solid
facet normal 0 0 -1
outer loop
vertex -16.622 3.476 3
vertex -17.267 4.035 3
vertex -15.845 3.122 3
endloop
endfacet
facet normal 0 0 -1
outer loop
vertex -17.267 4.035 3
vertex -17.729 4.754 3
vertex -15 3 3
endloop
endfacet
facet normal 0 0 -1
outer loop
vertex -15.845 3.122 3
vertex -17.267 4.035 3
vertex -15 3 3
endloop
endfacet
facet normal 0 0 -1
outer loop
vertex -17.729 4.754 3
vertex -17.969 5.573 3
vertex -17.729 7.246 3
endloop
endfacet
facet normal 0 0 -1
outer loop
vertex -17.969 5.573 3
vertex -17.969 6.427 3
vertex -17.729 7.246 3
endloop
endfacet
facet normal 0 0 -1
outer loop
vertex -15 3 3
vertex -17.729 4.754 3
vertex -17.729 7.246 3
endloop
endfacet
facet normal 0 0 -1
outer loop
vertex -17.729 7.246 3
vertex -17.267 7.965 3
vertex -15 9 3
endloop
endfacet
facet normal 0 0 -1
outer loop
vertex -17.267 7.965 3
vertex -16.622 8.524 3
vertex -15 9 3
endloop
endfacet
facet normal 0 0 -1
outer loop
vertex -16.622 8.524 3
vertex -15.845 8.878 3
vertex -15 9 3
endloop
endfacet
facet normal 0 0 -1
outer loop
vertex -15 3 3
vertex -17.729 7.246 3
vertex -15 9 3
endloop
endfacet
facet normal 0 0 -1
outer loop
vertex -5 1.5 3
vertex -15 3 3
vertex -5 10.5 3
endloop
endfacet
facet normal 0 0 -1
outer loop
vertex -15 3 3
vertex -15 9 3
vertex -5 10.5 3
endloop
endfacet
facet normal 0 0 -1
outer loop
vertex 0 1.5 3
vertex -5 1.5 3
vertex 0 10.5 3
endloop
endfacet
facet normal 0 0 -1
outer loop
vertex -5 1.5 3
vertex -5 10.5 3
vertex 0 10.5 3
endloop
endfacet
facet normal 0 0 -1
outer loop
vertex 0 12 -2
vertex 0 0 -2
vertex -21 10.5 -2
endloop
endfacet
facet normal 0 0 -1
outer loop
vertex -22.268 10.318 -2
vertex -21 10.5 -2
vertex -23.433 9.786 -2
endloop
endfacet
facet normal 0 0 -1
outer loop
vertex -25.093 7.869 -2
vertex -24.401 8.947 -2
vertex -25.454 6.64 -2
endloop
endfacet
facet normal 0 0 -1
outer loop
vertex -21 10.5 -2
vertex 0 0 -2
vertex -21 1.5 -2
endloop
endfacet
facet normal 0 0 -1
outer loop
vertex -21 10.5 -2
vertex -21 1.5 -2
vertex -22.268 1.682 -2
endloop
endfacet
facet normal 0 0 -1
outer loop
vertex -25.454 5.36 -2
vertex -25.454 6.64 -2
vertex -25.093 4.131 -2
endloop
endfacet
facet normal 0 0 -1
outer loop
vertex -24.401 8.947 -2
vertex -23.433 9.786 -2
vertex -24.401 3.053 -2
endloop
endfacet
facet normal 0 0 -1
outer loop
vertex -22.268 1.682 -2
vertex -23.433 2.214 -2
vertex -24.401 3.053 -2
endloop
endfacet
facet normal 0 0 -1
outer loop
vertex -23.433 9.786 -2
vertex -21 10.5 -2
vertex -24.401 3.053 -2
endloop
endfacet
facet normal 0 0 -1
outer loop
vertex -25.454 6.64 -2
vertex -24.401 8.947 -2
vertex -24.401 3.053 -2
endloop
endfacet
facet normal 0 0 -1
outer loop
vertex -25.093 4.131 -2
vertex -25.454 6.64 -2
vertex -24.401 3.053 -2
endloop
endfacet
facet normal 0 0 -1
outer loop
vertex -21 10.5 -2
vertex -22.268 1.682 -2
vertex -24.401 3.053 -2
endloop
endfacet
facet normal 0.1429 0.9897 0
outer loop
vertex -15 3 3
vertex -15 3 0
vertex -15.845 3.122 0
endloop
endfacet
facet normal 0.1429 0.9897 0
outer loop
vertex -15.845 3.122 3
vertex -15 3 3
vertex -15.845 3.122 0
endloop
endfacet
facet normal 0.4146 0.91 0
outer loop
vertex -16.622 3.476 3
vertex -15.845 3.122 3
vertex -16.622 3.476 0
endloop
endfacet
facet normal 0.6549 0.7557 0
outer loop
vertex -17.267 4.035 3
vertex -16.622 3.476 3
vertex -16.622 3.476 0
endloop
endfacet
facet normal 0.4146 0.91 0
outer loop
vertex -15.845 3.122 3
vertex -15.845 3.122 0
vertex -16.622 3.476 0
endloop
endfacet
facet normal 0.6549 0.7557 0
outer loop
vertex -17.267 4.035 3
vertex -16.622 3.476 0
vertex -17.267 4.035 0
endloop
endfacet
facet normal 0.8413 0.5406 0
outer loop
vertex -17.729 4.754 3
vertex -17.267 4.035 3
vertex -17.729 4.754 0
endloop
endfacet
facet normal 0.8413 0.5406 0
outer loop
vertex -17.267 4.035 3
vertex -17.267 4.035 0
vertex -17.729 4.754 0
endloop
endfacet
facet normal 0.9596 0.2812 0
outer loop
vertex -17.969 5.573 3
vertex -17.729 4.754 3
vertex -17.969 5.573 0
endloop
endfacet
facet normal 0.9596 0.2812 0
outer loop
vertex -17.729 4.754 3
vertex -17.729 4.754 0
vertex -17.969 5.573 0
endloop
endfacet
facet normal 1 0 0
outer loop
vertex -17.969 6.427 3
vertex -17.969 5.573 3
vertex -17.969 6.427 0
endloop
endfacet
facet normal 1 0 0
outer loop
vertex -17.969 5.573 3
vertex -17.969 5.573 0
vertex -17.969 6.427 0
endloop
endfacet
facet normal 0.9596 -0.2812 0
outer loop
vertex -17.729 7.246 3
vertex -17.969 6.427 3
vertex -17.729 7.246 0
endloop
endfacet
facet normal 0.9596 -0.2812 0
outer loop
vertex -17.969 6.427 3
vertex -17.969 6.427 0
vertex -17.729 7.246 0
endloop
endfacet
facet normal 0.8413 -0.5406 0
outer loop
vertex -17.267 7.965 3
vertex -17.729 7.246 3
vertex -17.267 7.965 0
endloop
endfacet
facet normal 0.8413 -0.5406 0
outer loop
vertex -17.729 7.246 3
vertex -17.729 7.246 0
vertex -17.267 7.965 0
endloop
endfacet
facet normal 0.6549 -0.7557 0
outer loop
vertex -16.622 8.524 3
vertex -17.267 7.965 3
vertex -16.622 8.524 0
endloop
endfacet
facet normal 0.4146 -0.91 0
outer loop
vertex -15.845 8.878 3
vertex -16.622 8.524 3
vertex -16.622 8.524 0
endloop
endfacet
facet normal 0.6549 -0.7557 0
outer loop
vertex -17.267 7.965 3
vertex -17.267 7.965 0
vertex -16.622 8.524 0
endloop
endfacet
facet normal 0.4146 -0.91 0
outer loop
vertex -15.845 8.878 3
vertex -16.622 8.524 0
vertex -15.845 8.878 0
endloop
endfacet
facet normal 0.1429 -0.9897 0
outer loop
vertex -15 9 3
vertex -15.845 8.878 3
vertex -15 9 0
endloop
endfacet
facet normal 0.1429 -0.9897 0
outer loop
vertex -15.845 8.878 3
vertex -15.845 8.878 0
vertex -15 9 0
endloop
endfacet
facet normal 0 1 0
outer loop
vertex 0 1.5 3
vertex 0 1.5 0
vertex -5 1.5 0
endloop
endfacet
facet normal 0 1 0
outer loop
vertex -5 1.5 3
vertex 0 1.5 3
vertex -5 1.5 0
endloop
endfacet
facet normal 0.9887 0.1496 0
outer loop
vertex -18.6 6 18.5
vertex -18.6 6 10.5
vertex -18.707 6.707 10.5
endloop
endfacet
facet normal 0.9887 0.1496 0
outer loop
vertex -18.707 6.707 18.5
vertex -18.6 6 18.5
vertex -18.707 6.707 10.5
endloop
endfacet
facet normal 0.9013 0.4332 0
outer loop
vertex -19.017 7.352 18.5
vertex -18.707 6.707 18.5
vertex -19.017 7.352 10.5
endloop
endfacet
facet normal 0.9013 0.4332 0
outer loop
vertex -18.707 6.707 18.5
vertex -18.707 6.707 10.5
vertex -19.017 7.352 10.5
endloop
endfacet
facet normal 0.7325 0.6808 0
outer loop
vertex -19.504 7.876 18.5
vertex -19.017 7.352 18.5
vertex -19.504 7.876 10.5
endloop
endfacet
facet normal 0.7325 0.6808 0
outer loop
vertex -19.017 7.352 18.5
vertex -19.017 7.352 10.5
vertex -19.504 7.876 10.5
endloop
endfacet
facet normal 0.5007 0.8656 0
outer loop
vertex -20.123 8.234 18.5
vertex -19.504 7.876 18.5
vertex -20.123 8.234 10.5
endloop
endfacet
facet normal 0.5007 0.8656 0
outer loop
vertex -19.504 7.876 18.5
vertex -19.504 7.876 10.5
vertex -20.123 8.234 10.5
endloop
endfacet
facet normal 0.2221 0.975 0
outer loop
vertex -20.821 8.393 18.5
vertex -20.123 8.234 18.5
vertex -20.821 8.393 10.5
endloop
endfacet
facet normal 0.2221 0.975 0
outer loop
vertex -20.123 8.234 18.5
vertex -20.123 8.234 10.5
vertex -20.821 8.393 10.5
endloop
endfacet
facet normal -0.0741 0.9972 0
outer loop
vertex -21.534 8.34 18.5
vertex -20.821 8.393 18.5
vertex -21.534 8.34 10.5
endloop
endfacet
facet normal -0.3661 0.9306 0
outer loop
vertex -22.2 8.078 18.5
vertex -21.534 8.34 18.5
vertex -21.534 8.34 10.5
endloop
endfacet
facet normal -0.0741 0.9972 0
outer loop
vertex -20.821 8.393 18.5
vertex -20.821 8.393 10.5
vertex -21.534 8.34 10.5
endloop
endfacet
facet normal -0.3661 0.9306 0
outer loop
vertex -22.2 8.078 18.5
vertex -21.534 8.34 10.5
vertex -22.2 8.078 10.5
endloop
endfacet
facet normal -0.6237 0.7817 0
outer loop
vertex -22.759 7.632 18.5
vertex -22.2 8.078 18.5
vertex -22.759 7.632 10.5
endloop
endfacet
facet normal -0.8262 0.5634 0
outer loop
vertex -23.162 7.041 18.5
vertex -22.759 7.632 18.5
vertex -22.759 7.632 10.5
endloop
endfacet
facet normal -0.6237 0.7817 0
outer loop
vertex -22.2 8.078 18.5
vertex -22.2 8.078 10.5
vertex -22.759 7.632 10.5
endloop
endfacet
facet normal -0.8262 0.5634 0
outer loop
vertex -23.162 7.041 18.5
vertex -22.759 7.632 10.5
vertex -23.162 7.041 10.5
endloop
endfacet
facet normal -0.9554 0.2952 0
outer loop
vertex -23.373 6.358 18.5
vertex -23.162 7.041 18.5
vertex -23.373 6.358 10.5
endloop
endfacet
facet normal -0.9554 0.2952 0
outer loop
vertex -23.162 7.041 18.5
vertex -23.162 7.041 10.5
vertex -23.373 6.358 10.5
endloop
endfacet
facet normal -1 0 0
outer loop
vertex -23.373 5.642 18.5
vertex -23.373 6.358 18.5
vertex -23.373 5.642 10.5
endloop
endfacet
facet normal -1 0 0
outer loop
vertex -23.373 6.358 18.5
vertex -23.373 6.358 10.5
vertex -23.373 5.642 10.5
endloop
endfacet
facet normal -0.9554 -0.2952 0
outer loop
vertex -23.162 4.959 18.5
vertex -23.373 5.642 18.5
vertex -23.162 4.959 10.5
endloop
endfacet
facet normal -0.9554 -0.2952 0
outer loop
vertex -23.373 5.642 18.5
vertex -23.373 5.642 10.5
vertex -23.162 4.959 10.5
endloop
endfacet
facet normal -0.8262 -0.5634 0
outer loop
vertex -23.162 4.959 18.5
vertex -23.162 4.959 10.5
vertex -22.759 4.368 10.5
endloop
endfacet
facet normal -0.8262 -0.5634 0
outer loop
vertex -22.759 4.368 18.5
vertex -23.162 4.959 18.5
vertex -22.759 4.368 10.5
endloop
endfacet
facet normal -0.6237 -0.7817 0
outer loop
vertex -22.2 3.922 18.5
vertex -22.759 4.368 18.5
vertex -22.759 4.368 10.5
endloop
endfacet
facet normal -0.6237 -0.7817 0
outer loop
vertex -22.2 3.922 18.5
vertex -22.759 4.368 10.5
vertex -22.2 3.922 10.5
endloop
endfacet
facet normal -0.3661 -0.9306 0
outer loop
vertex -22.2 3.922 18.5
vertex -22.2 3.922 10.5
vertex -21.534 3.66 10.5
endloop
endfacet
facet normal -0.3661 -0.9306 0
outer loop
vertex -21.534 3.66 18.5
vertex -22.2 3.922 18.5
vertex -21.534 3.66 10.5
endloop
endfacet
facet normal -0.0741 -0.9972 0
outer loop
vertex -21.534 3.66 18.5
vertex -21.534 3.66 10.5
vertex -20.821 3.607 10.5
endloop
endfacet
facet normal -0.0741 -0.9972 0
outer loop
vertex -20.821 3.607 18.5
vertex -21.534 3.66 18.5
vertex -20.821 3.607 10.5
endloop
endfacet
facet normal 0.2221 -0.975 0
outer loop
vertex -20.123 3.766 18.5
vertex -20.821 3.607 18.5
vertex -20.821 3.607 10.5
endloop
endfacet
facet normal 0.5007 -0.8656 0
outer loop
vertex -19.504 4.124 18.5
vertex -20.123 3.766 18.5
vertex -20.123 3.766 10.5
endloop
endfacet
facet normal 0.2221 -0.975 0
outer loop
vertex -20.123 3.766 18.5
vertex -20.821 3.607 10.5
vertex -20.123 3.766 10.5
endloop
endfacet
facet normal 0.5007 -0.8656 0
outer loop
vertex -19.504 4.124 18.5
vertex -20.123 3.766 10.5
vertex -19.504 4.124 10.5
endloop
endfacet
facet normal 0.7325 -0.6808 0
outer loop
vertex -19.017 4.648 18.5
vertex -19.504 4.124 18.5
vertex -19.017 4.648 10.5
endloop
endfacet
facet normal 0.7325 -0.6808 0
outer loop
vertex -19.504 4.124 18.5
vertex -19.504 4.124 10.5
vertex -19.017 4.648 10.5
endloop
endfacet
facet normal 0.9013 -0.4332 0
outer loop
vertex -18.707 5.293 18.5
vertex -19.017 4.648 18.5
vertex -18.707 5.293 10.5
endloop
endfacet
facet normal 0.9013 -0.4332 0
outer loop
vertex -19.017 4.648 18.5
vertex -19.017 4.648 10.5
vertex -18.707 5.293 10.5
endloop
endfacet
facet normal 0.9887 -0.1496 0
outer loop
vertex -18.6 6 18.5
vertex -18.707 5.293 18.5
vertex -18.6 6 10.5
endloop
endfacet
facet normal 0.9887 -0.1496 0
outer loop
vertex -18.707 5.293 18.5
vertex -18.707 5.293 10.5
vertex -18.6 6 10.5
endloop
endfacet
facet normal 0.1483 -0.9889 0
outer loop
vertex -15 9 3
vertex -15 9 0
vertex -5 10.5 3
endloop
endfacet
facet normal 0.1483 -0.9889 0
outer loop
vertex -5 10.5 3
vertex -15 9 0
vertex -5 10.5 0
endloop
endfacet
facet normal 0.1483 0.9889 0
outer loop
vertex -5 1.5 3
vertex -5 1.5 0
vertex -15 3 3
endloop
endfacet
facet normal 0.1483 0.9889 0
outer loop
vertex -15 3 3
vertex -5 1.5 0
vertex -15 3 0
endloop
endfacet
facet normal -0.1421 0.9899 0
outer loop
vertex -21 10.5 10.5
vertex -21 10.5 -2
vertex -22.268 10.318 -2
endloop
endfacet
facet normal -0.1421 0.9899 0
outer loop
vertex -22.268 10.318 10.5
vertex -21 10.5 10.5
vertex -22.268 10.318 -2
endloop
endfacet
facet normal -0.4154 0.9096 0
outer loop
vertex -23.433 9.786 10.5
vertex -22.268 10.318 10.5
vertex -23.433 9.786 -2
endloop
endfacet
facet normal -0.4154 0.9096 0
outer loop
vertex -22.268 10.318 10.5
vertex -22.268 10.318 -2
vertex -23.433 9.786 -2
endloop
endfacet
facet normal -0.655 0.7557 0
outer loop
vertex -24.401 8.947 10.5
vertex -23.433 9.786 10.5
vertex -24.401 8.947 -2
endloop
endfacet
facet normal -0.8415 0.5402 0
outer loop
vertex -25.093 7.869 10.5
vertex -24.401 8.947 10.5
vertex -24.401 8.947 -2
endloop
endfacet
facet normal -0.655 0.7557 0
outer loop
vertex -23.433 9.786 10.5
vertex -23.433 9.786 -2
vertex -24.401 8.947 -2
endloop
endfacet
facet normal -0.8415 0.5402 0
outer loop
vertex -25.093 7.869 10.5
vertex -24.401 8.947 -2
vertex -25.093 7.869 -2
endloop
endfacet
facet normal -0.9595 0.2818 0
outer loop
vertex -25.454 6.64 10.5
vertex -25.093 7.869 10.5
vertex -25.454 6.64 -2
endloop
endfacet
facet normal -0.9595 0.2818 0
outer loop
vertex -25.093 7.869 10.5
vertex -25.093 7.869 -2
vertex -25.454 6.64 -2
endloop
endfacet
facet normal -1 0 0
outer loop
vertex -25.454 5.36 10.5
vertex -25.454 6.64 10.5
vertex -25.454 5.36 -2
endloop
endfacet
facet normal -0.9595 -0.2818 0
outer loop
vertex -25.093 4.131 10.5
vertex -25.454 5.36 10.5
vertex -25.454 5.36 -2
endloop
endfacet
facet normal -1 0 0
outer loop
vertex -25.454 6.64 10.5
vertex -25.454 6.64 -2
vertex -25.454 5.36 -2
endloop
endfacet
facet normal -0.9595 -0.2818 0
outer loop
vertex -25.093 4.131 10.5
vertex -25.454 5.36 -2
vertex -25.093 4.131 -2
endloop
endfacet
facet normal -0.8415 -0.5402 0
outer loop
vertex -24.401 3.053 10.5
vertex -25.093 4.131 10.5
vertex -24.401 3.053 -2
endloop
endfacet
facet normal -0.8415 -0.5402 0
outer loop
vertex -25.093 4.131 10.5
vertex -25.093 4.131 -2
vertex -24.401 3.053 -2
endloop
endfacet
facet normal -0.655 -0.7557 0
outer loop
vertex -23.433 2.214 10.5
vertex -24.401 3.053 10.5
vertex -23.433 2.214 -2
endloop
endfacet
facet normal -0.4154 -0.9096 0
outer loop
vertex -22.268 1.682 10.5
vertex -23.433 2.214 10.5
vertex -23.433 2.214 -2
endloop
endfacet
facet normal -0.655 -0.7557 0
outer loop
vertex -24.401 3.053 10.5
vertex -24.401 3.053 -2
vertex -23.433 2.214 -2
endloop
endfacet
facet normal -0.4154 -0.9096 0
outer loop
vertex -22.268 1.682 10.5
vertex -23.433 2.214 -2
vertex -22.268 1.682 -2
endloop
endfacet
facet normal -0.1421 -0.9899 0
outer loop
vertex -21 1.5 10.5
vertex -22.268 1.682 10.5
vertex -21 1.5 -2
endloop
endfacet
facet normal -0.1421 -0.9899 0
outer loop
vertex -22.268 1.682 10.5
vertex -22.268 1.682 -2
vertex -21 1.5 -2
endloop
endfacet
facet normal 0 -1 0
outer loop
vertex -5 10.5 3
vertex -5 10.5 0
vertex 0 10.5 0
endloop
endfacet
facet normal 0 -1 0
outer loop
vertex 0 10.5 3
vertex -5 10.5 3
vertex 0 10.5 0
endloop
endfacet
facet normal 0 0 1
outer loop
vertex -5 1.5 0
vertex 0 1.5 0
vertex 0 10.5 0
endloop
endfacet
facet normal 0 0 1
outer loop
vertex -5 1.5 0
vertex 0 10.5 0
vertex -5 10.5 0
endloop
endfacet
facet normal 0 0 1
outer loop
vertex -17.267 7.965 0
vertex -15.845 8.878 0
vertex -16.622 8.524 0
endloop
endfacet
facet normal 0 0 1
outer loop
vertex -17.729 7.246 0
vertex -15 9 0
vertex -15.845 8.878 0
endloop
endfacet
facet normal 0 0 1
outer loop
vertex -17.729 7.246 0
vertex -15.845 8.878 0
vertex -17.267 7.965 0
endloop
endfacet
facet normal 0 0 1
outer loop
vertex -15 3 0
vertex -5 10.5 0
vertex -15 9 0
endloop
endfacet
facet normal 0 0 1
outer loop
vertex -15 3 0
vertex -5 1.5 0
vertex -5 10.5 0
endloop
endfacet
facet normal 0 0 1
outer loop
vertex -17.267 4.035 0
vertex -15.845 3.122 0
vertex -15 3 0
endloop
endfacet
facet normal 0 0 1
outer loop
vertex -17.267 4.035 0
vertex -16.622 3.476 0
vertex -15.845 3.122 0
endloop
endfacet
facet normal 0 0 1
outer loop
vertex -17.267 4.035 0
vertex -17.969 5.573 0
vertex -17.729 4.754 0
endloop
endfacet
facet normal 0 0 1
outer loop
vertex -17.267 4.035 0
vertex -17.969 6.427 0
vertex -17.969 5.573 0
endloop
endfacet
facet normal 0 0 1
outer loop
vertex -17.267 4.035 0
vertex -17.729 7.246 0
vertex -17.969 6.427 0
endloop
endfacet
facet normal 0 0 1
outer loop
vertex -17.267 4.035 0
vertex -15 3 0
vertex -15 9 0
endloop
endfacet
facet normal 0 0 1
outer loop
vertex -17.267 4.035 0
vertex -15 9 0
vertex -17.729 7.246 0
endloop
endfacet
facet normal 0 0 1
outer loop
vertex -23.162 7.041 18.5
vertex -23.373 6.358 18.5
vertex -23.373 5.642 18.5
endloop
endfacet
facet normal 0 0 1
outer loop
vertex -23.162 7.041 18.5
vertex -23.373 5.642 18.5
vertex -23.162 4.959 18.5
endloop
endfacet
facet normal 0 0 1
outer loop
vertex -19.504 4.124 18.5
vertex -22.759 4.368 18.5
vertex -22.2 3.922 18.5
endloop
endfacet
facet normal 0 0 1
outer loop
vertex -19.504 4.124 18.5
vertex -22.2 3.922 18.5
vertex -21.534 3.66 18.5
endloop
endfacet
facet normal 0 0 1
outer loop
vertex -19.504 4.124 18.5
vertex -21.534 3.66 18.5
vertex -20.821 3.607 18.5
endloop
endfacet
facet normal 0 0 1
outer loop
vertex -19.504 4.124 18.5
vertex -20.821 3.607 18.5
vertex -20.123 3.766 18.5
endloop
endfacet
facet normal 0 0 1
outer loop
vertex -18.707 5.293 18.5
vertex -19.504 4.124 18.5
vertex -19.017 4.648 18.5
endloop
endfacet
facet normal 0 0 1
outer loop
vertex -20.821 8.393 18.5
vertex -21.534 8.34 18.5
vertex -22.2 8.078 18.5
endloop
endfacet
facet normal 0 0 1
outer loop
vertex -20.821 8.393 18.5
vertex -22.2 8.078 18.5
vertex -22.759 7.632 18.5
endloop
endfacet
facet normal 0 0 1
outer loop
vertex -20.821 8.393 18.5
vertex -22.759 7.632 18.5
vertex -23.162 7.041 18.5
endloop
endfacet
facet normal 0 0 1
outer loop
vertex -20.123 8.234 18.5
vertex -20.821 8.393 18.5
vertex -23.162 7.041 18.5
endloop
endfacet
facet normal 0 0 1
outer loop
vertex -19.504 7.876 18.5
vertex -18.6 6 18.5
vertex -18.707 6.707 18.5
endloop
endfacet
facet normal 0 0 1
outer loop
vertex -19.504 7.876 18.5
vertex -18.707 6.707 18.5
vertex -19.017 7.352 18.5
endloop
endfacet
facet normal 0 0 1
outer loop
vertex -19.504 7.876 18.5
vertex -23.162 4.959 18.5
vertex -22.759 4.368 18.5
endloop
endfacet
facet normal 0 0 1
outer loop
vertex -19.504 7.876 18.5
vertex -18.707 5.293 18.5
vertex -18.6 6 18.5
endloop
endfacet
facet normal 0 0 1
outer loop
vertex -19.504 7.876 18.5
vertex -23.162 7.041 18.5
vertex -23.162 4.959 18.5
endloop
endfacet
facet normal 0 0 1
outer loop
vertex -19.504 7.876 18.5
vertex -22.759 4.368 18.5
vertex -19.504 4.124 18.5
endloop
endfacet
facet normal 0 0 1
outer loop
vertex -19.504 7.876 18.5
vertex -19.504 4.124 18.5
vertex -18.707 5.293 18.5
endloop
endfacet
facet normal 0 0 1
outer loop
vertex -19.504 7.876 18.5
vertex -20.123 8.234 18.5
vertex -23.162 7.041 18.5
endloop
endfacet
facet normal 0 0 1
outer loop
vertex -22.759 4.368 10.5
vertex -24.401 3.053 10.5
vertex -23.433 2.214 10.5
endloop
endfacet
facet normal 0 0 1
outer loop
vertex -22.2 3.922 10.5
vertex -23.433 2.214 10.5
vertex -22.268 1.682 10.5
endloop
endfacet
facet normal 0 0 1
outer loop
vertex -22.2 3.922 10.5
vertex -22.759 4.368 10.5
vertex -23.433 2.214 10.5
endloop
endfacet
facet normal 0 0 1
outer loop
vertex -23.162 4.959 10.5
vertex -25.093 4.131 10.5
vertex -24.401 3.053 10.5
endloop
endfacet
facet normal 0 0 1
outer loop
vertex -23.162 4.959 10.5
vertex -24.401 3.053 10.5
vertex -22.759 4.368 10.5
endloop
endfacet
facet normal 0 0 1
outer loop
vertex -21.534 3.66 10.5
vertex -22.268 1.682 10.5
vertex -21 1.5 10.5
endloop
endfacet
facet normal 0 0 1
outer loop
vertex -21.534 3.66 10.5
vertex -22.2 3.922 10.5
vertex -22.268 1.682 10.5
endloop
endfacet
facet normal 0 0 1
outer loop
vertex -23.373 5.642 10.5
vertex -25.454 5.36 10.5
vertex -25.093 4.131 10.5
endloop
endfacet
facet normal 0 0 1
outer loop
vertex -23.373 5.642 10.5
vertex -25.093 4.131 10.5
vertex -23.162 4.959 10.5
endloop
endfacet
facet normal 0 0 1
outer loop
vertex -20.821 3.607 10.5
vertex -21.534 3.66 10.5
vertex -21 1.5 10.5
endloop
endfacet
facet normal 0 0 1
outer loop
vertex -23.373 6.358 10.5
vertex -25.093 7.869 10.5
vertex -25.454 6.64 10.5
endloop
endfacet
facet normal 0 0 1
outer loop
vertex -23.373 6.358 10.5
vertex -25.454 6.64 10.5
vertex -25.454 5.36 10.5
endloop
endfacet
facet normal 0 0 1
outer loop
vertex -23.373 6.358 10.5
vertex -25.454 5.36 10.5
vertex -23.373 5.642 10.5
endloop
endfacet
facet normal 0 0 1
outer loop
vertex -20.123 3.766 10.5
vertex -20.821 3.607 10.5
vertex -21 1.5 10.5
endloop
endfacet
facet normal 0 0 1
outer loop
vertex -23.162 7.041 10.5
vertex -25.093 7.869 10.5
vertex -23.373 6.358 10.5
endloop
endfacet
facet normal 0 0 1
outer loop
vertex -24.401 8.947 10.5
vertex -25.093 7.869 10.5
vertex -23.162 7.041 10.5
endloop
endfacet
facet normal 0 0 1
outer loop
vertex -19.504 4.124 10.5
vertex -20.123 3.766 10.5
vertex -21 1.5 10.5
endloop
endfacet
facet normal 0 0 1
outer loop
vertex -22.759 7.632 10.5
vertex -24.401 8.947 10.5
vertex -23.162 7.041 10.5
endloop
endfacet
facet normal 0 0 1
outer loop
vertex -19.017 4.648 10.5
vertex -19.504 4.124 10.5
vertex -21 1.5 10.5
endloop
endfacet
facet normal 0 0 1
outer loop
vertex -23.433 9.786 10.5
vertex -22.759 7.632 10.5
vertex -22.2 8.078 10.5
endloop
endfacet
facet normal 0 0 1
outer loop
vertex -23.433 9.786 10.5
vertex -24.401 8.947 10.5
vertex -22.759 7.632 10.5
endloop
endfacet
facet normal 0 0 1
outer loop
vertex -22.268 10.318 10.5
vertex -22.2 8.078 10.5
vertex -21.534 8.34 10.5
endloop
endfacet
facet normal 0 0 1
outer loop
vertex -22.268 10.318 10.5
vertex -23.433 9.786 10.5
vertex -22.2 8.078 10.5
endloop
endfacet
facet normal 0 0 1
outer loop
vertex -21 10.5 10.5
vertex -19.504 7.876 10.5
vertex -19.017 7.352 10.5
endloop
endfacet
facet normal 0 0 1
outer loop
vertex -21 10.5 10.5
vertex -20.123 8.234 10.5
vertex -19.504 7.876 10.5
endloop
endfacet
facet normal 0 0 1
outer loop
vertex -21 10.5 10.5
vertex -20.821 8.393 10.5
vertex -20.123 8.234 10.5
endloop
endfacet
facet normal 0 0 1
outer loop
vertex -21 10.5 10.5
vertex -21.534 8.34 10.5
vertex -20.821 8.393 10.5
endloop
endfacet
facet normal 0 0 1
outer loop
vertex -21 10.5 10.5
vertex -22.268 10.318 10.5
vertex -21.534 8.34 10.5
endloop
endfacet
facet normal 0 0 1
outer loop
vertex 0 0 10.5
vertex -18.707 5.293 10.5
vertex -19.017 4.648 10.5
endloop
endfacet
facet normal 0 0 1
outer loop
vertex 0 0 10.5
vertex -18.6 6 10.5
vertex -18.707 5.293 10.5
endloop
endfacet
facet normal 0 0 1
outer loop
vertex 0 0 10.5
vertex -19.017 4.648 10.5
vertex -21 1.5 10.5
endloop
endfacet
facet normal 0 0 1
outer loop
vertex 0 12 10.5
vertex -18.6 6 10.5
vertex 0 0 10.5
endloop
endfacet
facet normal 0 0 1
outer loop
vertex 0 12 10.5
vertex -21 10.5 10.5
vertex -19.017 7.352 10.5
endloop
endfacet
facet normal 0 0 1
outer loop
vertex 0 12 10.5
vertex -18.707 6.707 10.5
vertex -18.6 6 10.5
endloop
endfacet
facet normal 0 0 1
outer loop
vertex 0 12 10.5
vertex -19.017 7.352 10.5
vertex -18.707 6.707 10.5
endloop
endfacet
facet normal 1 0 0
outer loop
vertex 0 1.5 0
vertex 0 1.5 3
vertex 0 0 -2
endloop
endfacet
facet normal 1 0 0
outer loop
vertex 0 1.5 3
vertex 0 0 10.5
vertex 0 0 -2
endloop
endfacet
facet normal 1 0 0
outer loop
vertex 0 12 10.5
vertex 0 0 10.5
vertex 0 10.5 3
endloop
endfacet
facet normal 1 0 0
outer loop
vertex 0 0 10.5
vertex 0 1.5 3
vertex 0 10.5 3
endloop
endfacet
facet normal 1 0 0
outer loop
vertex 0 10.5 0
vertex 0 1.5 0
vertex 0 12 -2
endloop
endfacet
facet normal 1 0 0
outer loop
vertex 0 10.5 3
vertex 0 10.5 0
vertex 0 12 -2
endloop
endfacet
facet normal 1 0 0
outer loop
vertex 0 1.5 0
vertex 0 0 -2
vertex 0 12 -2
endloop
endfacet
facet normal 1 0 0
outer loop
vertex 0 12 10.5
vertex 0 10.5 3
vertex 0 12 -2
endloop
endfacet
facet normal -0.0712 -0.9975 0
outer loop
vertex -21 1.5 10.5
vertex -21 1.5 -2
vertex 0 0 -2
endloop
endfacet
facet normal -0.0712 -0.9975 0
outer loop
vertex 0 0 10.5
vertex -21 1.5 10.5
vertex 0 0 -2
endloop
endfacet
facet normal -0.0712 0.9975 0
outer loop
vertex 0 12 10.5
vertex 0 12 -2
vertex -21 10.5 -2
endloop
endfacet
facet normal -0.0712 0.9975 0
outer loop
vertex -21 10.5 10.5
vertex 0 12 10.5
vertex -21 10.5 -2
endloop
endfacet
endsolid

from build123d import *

# Parameters (mm, degrees)
BOSS_EXTRUDE2_DEPTH = 3
BOSS_EXTRUDE3_DEPTH = 7.5
BOSS_EXTRUDE4_START = 2
BOSS_EXTRUDE4_DEPTH = 2
SKETCH5_R           = 2.4
BOSS_EXTRUDE5_DEPTH = 8


with BuildPart() as part:
    # Sketch1 → Boss-Extrude2 (new body)
    with BuildSketch(Plane(origin=(0, 0, 0), x_dir=(0, 1, 0), z_dir=(0, 0, 1))):
        with BuildLine():
            Line((0, 0), (1.5, 0))
            Line((1.5, 0), (1.5, 5))
            Line((1.5, 5), (3, 15))
            ThreePointArc((3, 15), (6, 18), (9, 15))
            Line((9, 15), (10.5, 5))
            Line((10.5, 5), (10.5, 0))
            Line((10.5, 0), (12, 0))
            Line((12, 0), (10.5, 21))
            ThreePointArc((10.5, 21), (6, 25.5), (1.5, 21))
            Line((1.5, 21), (0, 0))
        make_face()
    extrude(amount=BOSS_EXTRUDE2_DEPTH)

    # Sketch3 → Boss-Extrude3 (add)
    with BuildSketch(Plane.XY.offset(3)):
        with BuildLine():
            Line((0, 0), (0, 12))
            Line((0, 12), (-21, 10.5))
            ThreePointArc((-21, 10.5), (-25.5, 6), (-21, 1.5))
            Line((-21, 1.5), (0, 0))
        make_face()
    extrude(amount=BOSS_EXTRUDE3_DEPTH)

    # Sketch4 → Boss-Extrude4 (add)
    with BuildSketch(Plane(origin=(0, 0, 0), x_dir=(1, 0, 0), z_dir=(0, 0, -1)).offset(BOSS_EXTRUDE4_START)):
        with BuildLine():
            Line((0, 0), (0, -12))
            Line((0, -12), (-21, -10.5))
            ThreePointArc((-21, -10.5), (-25.5, -6), (-21, -1.5))
            Line((-21, -1.5), (0, 0))
        make_face()
    extrude(amount=-BOSS_EXTRUDE4_DEPTH)

    # Sketch5 → Boss-Extrude5 (add)
    with BuildSketch(Plane.XY.offset(10.5)):
        with Locations((-21, 6)):
            Circle(SKETCH5_R)
    extrude(amount=BOSS_EXTRUDE5_DEPTH)


solid = part.part
